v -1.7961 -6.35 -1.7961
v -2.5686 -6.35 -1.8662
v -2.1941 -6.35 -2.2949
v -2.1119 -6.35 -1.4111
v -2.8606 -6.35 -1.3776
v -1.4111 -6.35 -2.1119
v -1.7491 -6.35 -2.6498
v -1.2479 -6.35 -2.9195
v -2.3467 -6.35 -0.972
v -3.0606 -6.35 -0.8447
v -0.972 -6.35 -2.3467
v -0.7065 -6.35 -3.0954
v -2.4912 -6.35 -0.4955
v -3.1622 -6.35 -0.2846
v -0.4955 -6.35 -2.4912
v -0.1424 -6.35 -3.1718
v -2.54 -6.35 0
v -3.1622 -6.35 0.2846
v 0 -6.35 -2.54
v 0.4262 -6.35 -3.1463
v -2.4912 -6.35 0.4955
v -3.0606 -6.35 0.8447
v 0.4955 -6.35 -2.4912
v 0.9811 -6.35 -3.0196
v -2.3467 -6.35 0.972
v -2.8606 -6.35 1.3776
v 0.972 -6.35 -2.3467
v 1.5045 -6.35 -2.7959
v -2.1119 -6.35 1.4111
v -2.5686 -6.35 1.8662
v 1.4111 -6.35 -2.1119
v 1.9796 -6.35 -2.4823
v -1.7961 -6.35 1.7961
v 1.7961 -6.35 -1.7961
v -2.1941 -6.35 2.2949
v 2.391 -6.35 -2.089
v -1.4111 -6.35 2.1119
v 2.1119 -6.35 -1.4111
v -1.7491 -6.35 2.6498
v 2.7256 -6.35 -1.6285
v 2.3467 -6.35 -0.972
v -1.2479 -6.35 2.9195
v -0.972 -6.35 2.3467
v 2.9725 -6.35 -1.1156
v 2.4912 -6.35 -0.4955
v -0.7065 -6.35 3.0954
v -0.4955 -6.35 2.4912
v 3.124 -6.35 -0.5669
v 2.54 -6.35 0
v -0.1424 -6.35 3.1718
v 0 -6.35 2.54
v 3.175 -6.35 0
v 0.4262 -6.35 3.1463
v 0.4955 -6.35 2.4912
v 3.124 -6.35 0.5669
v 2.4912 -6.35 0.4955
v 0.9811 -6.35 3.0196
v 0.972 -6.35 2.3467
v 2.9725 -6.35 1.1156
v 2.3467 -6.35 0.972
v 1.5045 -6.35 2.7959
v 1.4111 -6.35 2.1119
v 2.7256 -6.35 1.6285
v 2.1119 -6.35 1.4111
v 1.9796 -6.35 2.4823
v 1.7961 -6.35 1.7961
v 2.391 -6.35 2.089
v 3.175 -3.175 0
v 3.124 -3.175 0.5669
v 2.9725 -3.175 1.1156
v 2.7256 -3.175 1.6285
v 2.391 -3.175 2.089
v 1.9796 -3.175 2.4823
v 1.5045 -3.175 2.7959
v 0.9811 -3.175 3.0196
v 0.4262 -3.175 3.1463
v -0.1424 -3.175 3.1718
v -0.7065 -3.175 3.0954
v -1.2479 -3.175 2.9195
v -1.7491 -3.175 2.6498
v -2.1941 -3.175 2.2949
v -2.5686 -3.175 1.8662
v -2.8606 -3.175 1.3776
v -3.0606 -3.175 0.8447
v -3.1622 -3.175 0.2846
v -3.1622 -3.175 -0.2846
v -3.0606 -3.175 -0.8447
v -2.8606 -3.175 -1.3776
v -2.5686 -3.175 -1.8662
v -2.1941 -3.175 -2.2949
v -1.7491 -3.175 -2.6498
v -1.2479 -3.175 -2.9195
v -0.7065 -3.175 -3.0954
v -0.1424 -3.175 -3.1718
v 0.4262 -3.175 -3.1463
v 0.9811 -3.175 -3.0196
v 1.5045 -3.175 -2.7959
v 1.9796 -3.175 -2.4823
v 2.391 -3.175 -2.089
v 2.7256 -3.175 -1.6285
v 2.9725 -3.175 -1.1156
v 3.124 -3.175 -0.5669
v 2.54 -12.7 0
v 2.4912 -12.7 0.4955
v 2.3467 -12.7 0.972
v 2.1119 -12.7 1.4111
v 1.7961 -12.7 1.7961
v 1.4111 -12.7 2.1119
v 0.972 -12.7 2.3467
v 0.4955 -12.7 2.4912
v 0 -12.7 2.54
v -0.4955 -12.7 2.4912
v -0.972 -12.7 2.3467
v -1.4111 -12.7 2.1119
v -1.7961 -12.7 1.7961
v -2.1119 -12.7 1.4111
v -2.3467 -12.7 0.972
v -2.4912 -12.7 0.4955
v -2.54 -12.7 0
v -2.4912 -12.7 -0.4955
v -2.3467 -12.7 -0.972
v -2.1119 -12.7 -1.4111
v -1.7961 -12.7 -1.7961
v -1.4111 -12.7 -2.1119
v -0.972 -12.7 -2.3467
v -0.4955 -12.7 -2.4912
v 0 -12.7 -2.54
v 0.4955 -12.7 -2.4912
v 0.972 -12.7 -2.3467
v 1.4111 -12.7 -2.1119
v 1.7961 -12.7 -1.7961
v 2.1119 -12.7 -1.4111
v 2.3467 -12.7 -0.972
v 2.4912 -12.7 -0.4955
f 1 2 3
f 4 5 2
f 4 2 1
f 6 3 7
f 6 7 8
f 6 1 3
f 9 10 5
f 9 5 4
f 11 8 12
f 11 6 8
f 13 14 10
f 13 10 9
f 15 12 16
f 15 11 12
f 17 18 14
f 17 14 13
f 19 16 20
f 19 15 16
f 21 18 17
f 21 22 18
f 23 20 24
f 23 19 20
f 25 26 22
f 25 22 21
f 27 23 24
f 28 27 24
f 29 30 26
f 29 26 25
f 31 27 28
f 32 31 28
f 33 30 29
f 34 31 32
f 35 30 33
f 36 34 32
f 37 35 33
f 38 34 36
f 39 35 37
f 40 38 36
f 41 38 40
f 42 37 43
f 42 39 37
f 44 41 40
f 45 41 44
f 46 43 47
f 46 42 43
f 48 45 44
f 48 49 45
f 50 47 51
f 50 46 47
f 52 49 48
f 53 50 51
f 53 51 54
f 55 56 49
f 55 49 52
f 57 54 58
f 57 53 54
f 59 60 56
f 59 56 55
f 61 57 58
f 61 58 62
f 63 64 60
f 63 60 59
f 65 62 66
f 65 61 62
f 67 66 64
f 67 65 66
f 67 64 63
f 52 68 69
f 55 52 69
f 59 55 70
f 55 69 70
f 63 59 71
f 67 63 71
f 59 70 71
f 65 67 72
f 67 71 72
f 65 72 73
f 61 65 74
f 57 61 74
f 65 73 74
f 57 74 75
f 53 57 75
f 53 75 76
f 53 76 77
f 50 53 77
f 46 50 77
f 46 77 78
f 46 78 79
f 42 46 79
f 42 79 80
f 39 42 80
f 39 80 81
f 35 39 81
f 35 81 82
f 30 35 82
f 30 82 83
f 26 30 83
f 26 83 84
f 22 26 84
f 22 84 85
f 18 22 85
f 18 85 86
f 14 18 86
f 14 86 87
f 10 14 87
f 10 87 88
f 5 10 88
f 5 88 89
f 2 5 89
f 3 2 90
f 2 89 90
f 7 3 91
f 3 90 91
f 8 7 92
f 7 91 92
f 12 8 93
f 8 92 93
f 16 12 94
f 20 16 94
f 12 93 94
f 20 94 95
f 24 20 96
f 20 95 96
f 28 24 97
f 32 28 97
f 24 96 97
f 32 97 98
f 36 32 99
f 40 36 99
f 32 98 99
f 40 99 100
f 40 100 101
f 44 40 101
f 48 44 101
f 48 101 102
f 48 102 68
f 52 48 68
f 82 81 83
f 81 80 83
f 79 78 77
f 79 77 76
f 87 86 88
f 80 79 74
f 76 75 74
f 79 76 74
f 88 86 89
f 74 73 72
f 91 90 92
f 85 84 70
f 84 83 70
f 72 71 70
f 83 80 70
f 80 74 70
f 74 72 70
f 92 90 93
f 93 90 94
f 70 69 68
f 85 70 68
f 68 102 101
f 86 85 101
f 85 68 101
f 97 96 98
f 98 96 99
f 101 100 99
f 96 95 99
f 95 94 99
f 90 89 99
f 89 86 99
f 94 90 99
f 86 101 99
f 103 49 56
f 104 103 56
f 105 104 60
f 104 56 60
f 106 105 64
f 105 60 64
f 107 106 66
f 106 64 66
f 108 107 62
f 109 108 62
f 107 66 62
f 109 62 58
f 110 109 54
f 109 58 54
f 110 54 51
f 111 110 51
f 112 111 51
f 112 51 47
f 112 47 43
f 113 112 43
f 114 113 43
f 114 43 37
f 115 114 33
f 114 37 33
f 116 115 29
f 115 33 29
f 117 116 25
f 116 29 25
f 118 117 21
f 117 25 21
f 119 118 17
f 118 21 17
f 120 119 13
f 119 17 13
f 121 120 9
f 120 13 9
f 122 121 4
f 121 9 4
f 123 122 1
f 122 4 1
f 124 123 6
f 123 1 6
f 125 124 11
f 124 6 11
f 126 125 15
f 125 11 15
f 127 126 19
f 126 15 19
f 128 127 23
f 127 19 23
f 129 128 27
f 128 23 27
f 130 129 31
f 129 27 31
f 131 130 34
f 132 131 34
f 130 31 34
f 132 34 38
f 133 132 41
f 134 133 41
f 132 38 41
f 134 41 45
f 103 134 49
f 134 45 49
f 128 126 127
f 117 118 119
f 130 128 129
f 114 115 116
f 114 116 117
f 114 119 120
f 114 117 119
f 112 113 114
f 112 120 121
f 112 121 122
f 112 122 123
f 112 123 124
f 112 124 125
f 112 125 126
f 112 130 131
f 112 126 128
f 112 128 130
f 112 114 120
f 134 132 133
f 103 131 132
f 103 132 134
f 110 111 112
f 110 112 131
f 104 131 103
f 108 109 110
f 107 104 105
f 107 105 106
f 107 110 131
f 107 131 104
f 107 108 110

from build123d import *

# Parameters (mm, degrees)
F0_R          = 3.175
F1_DEPTH      = 6.35
F2_R          = 2.54
F3_DEPTH      = 6.35
F3_DEPTH_BACK = 12.7
F5_DEPTH      = 12.7
F6_W          = 10.36966
F6_H          = 6.35
F7_DEPTH      = 25.4


with BuildPart() as f1:
    # F0 (on Front) → F1 (new body)
    with BuildSketch(Plane.XZ):
        Circle(F0_R)
    extrude(amount=F1_DEPTH)

    # F2 (on face) → F3 (join, two sides)
    with BuildSketch(Plane.XZ.offset(6.35)) as f3_sk:
        Circle(F2_R)
    extrude(amount=F3_DEPTH)
    extrude(f3_sk.sketch, amount=-F3_DEPTH_BACK)

    # F4 (on Right) → F5 (cut)
    with BuildSketch(Plane.YZ):
        Polygon((8.097555, 3.648834), (-3.175, 3.868401), (-3.175, 0), (-3.175, -4.03599), (8.097555, -4.03599), align=None)
    extrude(amount=-F5_DEPTH, mode=Mode.SUBTRACT)

    # F6 (on face) → F7 (cut)
    with BuildSketch(Plane(origin=(0, 0, 0), x_dir=(0, -1, 0), z_dir=(-1, 0, 0))):
        with Locations((-2.00983, 0)):
            Rectangle(F6_W, F6_H)
    extrude(amount=-F7_DEPTH, mode=Mode.SUBTRACT)


solid = f1.part
